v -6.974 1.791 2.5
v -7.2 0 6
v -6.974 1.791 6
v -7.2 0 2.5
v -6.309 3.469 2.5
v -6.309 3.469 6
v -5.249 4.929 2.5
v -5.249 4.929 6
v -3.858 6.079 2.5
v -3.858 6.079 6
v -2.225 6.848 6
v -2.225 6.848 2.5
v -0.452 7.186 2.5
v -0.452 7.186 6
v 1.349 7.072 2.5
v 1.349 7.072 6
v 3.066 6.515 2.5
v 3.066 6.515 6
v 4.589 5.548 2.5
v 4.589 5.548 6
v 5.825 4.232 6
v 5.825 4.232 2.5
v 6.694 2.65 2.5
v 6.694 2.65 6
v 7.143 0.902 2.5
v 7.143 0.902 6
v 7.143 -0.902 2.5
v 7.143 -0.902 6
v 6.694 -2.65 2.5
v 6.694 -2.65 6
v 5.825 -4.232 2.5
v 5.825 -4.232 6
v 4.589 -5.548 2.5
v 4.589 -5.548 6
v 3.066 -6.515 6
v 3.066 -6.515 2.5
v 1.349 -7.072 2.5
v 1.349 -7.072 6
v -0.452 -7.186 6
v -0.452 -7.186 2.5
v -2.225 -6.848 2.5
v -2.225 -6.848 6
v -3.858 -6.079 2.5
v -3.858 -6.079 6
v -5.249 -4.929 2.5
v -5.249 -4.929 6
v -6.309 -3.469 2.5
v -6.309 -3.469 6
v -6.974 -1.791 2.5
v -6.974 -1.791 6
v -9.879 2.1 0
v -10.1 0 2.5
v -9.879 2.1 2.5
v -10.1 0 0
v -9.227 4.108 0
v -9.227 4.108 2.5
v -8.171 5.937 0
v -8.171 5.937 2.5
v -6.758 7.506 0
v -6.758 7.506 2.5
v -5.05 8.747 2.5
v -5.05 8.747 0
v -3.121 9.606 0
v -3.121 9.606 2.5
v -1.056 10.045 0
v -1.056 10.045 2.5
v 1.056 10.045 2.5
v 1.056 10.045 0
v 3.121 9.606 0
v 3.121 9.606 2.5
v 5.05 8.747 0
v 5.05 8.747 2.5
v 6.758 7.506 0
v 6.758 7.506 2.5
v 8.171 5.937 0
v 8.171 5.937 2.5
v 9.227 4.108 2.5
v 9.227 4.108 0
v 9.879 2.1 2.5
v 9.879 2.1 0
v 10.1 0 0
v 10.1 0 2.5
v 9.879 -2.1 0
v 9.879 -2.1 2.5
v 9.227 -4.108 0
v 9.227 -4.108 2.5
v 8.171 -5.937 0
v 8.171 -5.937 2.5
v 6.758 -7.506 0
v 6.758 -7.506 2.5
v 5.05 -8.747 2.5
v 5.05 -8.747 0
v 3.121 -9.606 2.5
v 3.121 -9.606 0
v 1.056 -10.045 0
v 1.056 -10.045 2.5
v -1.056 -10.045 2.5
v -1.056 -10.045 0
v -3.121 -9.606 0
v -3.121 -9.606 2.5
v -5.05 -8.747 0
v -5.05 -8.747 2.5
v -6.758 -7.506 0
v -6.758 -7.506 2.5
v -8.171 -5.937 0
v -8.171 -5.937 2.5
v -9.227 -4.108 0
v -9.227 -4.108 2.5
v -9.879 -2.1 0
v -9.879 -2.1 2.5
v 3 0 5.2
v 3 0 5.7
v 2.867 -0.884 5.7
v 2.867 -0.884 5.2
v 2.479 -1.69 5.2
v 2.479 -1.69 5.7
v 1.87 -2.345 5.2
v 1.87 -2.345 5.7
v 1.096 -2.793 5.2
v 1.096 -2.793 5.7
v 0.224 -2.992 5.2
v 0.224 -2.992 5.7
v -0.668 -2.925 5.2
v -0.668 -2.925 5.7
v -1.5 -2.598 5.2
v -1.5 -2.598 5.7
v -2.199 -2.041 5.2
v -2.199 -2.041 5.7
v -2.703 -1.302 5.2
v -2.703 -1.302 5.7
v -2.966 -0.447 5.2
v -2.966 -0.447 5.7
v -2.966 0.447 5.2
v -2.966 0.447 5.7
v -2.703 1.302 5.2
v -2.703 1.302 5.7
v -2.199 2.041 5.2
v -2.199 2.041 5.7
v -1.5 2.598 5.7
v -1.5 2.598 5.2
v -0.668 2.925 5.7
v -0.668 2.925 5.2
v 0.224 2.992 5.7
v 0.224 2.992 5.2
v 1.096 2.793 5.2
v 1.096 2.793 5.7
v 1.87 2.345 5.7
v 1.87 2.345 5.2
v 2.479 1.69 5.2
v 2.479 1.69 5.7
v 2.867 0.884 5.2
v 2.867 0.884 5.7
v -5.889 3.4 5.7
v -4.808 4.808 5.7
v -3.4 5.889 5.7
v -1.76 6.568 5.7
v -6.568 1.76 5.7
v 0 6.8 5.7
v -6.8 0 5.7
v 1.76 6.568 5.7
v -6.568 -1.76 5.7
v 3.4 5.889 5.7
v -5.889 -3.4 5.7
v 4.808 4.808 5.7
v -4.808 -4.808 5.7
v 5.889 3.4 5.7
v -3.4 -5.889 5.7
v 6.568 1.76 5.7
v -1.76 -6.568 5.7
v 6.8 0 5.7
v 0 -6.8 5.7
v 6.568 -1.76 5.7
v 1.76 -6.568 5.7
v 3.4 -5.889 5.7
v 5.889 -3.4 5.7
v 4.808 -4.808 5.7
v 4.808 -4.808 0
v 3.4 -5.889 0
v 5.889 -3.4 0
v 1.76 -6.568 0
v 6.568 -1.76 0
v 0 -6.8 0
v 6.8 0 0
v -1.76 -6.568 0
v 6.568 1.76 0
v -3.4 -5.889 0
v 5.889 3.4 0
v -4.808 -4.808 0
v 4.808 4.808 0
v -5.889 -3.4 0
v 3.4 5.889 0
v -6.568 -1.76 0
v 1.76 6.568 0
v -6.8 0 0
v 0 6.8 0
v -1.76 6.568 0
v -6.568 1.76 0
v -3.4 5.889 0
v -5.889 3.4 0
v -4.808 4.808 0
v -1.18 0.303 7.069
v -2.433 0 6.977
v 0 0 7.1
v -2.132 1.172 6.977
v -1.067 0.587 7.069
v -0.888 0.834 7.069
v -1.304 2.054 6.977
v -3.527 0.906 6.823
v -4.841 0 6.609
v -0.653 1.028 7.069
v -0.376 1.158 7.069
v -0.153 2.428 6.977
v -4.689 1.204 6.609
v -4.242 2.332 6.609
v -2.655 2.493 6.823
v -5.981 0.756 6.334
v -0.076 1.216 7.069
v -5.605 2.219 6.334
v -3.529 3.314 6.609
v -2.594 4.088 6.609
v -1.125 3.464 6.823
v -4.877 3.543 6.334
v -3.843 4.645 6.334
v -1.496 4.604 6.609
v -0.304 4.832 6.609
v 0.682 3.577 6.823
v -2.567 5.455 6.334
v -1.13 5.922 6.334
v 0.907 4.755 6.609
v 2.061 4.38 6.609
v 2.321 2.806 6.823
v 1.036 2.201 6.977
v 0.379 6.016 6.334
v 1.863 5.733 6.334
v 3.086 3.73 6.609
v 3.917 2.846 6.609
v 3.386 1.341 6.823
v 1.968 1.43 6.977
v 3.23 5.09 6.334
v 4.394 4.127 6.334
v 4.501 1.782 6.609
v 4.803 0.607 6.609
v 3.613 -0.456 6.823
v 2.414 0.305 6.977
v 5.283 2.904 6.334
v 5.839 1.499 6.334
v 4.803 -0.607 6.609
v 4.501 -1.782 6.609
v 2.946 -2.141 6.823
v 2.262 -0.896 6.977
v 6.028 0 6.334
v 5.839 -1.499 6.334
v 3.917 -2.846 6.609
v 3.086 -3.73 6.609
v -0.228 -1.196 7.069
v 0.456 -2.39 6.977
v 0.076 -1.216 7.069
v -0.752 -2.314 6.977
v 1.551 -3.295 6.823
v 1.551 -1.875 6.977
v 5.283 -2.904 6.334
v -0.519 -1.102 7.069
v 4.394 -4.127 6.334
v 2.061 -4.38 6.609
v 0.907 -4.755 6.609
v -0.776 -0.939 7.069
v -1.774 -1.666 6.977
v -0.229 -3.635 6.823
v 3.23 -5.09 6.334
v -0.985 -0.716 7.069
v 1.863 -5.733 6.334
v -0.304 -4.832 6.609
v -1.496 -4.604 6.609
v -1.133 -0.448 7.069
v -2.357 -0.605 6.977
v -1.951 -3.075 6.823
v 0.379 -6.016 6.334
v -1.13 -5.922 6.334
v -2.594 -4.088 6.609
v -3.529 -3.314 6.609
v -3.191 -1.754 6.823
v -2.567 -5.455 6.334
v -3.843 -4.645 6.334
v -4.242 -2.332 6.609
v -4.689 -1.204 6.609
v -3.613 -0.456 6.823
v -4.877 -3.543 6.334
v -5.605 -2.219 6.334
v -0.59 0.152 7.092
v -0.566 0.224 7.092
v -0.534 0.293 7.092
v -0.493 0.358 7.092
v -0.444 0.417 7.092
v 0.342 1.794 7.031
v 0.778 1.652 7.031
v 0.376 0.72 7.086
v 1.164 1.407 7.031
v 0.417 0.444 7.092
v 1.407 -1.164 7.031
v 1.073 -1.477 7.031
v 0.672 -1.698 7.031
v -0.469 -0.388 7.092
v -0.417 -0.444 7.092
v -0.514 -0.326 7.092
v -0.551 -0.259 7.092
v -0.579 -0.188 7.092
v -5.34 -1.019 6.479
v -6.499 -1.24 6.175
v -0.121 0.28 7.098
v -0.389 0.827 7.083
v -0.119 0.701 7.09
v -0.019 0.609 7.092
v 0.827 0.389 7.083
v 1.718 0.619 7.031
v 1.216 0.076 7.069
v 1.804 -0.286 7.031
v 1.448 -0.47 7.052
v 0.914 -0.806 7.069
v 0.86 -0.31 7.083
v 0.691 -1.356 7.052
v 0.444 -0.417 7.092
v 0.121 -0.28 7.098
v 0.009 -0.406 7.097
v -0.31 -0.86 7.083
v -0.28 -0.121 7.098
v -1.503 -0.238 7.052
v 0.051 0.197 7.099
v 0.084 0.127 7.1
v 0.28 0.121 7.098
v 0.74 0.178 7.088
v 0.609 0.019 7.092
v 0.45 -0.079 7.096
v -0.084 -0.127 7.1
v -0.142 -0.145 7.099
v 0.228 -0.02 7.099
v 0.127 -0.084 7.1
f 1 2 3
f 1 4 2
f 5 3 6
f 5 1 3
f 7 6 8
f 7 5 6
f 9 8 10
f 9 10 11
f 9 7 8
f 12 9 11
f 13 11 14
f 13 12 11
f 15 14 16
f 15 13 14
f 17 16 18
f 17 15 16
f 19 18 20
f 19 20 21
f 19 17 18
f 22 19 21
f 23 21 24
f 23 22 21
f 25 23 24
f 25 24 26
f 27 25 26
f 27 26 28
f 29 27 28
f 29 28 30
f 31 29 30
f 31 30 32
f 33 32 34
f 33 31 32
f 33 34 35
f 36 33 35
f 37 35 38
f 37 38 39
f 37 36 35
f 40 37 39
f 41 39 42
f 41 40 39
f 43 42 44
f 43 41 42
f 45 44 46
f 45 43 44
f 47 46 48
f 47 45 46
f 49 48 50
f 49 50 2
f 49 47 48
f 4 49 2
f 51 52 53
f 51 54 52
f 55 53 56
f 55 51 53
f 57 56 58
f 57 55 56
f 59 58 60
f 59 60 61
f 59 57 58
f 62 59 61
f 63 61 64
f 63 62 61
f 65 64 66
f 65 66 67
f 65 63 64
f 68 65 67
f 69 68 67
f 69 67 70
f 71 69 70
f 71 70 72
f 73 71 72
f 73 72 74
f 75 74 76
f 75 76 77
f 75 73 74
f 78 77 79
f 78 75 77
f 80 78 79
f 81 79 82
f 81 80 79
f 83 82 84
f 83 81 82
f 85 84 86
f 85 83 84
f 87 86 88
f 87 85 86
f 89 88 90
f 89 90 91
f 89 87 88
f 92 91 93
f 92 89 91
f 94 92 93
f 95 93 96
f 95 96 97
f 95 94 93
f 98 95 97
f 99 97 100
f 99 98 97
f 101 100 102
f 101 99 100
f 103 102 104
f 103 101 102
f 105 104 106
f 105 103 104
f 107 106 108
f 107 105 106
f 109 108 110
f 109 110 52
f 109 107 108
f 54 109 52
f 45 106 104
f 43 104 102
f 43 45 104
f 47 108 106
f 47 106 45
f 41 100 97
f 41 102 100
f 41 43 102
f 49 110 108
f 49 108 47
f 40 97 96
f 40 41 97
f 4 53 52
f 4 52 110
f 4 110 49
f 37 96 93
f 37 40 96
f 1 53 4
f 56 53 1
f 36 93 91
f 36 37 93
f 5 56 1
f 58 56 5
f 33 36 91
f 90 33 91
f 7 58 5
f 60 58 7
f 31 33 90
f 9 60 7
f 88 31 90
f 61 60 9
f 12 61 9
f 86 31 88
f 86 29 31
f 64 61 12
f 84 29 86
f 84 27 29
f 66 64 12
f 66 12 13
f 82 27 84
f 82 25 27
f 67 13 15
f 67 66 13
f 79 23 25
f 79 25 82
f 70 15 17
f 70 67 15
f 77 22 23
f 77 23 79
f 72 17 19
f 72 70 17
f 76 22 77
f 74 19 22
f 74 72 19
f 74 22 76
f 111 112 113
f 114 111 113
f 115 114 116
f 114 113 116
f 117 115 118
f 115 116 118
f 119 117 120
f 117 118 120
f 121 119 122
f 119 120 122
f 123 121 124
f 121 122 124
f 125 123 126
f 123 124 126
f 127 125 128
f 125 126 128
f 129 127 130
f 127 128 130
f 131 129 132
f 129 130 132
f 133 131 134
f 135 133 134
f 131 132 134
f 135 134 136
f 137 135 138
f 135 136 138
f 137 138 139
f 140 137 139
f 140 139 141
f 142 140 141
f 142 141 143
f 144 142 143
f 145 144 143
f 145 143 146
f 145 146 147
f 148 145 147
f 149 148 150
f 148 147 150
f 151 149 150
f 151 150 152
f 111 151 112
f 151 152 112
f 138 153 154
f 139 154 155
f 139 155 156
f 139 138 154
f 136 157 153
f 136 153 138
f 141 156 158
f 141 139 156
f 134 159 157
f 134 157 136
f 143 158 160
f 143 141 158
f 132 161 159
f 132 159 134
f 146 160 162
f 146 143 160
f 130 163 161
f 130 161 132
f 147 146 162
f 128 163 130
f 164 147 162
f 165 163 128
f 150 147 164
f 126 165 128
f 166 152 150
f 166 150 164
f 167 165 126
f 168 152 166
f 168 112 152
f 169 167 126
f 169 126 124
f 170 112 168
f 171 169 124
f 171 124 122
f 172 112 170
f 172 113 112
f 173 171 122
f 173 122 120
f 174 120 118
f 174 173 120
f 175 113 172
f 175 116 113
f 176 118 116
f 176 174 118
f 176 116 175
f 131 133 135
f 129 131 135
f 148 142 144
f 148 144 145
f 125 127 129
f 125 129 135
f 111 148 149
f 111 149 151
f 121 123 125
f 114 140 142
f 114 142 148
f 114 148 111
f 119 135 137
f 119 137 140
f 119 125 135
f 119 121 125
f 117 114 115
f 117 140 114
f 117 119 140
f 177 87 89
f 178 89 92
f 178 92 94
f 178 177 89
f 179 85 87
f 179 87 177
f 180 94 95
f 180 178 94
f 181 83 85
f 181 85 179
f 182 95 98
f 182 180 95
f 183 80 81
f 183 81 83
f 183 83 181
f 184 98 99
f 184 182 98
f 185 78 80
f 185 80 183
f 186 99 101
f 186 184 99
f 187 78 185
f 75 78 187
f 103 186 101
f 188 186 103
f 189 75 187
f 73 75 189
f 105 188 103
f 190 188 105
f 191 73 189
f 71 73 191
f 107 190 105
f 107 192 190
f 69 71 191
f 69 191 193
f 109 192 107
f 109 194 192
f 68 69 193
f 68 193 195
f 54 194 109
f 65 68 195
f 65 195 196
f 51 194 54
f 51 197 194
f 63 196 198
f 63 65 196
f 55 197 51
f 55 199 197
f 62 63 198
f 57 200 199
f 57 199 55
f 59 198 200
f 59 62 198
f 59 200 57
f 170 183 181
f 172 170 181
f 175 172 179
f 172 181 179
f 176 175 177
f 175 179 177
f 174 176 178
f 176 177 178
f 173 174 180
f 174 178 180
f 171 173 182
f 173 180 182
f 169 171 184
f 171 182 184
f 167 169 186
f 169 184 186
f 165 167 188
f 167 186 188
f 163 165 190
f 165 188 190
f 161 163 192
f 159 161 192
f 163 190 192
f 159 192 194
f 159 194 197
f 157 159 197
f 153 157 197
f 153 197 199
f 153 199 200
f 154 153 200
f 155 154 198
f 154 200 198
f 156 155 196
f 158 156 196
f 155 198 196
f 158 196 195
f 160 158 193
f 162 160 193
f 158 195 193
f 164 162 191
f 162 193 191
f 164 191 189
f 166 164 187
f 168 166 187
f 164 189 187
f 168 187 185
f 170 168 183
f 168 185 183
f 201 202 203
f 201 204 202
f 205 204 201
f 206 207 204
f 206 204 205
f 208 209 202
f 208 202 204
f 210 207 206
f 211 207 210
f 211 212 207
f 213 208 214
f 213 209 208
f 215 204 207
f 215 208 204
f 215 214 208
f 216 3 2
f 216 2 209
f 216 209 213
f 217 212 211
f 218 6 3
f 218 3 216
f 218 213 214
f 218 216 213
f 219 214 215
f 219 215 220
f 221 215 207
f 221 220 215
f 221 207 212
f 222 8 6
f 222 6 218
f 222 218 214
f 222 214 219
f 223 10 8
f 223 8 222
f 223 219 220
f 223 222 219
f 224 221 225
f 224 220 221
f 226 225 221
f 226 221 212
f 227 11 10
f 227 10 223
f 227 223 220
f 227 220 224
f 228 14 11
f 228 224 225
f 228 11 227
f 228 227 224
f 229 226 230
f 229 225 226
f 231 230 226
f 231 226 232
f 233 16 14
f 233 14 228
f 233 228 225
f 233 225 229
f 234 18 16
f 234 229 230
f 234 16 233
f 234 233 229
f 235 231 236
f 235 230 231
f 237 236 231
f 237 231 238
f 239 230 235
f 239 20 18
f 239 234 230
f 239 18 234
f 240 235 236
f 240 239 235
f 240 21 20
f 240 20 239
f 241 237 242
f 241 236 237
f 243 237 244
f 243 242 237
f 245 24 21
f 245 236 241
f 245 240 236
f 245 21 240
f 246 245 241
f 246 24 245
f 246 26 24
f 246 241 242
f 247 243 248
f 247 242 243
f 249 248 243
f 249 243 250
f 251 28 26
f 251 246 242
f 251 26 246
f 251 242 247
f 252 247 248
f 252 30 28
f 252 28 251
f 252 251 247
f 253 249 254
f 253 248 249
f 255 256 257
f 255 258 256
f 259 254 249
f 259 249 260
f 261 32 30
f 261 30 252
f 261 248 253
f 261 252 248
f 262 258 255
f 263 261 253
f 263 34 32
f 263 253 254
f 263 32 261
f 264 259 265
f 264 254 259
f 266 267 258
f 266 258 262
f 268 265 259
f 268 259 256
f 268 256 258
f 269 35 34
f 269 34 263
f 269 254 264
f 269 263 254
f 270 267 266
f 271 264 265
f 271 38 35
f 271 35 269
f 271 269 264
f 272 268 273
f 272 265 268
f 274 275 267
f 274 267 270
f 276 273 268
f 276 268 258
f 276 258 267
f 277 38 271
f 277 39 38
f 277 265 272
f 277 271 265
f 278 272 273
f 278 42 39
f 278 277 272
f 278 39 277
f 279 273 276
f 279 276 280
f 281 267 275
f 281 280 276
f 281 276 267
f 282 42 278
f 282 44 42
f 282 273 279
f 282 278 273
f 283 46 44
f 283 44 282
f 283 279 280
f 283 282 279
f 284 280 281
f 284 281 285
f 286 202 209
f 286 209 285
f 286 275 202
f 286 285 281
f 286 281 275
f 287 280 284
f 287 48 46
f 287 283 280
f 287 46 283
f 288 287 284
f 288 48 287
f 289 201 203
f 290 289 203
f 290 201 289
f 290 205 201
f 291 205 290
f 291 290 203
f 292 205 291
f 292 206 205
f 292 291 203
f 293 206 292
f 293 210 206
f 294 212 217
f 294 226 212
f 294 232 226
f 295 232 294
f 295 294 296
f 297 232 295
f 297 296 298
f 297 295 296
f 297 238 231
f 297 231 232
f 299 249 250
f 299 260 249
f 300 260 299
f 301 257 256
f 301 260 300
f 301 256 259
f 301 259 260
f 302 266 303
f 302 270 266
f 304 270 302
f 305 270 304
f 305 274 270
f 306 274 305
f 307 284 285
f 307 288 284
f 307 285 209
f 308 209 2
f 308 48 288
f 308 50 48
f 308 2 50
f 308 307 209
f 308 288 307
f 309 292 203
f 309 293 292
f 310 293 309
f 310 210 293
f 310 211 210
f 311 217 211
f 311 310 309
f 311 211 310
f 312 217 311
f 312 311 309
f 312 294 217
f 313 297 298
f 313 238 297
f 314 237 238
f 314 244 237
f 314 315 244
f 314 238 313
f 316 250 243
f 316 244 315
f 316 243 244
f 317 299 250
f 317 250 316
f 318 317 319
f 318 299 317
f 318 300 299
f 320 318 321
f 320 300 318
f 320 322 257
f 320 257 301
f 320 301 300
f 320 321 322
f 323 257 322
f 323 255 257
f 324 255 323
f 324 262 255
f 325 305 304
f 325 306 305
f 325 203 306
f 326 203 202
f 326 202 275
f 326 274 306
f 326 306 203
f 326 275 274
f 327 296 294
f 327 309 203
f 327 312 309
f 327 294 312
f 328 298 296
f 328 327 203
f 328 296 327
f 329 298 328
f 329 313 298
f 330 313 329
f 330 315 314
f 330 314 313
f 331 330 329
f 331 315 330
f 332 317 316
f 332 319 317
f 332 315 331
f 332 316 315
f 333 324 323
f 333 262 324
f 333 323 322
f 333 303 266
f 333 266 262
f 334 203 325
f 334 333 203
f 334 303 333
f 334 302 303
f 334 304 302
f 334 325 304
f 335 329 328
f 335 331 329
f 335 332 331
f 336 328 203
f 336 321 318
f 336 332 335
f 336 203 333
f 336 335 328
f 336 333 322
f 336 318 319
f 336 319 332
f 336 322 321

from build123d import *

# Parameters (mm, degrees)
F2_R     = 6.8
F3_DEPTH = 5.7
F4_R     = 3
F5_DEPTH = 0.5


with BuildPart() as f1:
    # F0 (on Front) → F1 (revolve)
    with BuildSketch(Plane.XZ):
        with BuildLine():
            Line((-10.1, 0), (0, 0))
            Line((0, 0), (0, 7.1))
            ThreePointArc((0, 7.1), (-3.641772, 6.823414), (-7.2, 6))
            Line((-7.2, 6), (-7.2, 2.5))
            Line((-7.2, 2.5), (-10.1, 2.5))
            Line((-10.1, 2.5), (-10.1, 0))
        make_face()
    revolve(axis=Axis((0, 0, 3.55), (0, 0, -1)))

    # F2 (on face) → F3 (cut)
    with BuildSketch(Plane(origin=(0, 0, 0), x_dir=(1, 0, 0), z_dir=(0, 0, -1))):
        Circle(F2_R)
    extrude(amount=-F3_DEPTH, mode=Mode.SUBTRACT)

    # F4 (on face) → F5 (join)
    with BuildSketch(Plane(origin=(0, 0, 5.7), x_dir=(1, 0, 0), z_dir=(0, 0, -1))):
        Circle(F4_R)
    extrude(amount=F5_DEPTH)


solid = f1.part
